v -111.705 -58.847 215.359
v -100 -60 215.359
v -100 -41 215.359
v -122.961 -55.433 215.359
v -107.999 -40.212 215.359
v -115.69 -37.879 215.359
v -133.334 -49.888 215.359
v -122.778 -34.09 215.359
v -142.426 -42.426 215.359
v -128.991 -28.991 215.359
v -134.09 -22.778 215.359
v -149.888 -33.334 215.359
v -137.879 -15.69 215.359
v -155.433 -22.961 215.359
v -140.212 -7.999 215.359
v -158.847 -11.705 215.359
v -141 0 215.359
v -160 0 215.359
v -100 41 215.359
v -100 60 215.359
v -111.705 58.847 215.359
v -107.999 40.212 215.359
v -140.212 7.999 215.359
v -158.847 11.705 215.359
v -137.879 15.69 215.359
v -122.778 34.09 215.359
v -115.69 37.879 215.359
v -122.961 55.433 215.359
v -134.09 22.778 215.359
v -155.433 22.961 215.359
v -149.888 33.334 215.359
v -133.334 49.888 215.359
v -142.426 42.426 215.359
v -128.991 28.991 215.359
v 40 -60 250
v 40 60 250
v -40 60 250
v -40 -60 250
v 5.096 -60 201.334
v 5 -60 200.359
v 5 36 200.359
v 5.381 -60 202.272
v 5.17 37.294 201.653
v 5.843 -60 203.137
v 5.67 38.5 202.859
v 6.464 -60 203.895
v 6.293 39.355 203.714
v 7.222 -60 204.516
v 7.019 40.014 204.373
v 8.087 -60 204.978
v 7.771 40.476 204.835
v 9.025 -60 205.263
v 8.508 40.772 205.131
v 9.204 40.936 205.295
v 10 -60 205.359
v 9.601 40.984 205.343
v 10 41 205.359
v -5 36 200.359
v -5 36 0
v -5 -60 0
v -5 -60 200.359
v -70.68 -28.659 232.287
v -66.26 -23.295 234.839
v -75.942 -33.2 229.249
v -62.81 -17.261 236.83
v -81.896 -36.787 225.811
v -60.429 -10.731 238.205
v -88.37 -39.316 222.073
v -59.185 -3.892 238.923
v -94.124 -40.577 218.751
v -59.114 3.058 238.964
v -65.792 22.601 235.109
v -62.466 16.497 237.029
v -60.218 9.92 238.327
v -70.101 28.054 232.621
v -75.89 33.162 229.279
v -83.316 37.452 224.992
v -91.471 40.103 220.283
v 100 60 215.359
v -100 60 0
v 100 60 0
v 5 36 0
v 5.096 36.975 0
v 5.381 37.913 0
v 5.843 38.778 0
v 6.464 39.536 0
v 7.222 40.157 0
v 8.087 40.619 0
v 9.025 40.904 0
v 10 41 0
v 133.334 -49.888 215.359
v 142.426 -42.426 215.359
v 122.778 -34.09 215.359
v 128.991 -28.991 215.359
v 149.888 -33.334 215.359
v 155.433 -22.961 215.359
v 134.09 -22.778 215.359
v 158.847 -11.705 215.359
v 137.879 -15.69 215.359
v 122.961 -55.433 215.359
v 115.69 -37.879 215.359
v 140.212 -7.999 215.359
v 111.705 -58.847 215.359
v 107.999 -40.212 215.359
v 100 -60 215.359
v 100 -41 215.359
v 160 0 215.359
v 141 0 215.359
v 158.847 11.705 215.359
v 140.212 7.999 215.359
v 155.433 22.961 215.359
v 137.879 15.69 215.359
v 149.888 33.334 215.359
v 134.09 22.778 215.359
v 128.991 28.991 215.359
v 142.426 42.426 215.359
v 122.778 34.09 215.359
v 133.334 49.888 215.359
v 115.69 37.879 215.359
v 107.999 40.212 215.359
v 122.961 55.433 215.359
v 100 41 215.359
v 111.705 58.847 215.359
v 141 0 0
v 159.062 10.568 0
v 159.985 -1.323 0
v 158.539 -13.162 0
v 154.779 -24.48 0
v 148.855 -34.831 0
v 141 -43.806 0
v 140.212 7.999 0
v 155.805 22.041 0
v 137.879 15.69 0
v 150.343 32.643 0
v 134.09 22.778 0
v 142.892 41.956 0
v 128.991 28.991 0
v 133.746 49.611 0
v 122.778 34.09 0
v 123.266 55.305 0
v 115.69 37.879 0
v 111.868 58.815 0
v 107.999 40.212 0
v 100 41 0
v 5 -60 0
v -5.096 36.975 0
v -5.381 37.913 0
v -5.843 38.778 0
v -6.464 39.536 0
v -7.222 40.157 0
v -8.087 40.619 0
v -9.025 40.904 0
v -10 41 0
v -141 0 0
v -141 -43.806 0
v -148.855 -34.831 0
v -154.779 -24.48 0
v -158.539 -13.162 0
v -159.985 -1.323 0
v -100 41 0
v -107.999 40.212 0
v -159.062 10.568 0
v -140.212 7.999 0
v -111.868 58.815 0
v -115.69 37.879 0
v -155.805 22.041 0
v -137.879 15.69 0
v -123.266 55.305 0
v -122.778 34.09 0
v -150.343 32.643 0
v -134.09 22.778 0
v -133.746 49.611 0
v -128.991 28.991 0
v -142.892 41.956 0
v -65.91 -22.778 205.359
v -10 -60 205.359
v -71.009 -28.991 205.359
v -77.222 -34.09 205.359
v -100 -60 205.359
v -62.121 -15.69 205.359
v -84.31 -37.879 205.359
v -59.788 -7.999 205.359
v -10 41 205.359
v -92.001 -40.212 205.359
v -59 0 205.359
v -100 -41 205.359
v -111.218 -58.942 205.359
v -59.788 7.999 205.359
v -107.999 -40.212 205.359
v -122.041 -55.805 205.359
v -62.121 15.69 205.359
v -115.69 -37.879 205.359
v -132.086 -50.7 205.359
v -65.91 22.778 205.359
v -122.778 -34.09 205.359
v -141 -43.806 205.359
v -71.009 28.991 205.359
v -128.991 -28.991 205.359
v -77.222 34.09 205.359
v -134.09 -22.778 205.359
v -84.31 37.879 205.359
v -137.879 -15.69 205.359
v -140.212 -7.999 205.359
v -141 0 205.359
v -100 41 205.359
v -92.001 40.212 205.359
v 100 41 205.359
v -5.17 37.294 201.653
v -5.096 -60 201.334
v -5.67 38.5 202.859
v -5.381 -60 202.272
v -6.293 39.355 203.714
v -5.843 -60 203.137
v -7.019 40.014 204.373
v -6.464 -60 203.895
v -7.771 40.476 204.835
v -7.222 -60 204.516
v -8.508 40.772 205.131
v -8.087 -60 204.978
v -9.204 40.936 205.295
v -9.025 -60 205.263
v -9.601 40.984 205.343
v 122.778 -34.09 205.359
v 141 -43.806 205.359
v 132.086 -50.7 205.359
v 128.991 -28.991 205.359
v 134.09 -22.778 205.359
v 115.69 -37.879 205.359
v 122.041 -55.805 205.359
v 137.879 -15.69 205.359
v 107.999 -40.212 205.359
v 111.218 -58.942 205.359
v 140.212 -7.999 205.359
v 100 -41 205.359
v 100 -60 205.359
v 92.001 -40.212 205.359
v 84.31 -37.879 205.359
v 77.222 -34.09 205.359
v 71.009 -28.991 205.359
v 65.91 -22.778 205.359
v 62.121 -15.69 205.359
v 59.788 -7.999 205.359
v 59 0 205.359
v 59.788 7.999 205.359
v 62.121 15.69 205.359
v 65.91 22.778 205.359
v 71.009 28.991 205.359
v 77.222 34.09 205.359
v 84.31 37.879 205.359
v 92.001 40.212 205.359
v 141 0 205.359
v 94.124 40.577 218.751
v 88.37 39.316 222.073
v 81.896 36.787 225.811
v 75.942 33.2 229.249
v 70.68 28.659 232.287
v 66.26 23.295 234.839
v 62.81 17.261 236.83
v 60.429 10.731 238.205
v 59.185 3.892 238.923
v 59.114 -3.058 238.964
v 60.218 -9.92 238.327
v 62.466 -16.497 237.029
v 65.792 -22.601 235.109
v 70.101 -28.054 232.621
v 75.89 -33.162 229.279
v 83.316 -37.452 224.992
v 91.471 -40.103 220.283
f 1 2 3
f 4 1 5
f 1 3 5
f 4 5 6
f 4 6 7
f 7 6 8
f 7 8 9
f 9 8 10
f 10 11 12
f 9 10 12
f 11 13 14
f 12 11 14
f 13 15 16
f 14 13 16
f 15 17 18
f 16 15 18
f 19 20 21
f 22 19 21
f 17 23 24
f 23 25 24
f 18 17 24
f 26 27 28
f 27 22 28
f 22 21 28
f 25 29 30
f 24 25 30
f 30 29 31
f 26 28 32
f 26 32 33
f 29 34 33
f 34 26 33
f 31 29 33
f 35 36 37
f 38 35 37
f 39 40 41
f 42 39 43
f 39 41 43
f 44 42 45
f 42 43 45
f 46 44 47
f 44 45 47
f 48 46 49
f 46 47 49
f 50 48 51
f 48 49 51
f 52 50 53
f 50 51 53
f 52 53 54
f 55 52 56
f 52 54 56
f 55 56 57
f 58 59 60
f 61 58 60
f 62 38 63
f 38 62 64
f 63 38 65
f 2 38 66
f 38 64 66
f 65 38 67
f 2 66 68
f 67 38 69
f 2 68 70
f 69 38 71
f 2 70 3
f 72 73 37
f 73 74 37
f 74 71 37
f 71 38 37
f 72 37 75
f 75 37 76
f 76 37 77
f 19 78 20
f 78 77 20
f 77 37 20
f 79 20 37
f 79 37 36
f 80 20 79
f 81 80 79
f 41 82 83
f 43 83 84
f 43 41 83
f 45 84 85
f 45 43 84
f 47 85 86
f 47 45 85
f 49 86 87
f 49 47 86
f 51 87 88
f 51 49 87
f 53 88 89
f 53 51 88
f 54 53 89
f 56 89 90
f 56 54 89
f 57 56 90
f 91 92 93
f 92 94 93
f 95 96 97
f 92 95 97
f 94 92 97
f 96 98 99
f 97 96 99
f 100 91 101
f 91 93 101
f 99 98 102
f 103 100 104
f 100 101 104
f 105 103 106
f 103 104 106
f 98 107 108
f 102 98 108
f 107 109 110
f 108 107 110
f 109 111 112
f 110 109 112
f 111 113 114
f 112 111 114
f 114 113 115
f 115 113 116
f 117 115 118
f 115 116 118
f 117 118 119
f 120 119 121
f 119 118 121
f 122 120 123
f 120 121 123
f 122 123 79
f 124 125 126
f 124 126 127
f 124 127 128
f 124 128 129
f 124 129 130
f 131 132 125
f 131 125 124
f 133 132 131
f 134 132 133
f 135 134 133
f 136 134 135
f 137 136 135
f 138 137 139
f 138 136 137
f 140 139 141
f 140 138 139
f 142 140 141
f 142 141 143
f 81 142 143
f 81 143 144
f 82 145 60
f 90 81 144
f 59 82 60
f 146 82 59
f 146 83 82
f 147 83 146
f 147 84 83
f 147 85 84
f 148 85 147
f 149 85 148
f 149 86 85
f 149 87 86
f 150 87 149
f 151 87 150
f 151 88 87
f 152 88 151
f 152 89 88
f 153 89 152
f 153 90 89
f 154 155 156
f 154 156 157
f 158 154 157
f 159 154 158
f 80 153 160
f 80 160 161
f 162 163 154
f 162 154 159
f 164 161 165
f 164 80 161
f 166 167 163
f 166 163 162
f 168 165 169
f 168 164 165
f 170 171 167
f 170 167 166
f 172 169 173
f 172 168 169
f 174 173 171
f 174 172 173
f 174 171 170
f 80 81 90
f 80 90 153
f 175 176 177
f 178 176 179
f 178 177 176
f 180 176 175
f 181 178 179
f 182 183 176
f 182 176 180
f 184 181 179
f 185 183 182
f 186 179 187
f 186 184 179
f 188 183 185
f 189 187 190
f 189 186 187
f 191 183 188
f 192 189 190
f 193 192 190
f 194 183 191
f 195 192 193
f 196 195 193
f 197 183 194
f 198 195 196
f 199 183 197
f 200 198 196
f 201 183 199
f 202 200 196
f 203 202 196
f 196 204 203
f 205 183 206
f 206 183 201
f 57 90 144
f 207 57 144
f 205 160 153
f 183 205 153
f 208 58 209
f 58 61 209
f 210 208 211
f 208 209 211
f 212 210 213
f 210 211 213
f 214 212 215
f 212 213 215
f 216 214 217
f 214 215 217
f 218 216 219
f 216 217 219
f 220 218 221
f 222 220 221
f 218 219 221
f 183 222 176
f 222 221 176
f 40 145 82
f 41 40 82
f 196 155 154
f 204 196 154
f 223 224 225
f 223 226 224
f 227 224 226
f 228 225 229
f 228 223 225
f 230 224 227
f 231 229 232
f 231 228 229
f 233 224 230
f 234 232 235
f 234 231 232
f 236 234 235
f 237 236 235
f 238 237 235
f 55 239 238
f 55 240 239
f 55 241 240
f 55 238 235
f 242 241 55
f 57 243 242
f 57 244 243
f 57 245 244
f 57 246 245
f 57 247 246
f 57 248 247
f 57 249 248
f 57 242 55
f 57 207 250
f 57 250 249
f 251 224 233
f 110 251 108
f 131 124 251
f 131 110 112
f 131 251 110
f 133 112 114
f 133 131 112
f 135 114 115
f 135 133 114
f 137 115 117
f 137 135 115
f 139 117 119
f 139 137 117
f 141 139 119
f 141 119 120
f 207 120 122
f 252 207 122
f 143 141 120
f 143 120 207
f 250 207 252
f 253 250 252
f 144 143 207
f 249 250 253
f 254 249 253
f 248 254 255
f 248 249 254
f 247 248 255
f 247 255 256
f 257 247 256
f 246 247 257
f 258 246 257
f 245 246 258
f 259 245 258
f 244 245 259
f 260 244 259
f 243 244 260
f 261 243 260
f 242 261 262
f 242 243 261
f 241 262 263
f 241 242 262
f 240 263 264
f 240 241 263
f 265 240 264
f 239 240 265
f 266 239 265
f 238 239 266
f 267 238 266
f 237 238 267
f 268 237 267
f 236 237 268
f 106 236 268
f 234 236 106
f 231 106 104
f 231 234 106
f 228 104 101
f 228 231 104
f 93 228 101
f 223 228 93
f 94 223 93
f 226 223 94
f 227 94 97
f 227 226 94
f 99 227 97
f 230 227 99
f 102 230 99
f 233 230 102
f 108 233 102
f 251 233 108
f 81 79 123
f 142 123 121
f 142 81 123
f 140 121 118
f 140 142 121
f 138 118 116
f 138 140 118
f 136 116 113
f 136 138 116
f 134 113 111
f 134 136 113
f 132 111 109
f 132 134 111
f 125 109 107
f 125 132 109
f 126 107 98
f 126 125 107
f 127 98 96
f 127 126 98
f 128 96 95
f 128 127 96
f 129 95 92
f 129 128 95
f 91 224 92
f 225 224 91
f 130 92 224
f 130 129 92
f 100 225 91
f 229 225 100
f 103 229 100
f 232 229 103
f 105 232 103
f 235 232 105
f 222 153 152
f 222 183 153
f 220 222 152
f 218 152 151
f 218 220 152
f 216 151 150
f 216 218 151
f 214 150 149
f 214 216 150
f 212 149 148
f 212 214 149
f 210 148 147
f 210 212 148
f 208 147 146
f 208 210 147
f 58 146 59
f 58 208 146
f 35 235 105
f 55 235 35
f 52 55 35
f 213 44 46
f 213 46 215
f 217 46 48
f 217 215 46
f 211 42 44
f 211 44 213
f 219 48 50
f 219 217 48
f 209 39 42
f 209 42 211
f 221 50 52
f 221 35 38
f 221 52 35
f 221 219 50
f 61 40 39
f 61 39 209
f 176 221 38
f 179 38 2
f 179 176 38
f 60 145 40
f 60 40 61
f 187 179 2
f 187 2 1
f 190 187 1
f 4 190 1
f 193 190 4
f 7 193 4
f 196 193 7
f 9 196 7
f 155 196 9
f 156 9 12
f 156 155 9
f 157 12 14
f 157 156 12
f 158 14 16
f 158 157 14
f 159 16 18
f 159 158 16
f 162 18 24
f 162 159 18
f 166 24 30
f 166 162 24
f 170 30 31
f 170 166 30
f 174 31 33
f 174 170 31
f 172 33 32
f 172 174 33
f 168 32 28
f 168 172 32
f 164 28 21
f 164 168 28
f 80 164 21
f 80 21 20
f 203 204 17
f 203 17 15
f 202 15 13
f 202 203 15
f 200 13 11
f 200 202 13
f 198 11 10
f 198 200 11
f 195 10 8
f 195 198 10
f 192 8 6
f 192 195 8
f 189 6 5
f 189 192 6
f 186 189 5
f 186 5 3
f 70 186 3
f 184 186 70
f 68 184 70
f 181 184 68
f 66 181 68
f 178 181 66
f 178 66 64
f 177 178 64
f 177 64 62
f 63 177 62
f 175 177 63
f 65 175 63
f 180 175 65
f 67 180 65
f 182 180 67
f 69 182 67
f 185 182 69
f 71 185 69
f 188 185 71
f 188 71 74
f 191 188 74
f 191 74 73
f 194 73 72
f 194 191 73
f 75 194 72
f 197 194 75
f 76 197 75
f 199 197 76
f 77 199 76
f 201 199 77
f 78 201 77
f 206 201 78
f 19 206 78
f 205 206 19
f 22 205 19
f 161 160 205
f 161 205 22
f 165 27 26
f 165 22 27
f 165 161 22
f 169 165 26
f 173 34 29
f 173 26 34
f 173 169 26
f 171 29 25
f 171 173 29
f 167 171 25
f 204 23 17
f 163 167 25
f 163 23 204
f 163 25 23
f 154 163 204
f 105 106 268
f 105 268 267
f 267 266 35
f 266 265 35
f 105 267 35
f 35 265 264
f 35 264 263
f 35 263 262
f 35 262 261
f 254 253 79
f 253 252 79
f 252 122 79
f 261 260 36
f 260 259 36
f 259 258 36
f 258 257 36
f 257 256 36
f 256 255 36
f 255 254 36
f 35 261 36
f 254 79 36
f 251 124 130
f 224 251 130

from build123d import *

# Parameters (mm, degrees)
SKETCH1_R           = 41
BOSS_EXTRUDE1_DEPTH = 250
CUT_EXTRUDE2_DEPTH  = 130
CUT_EXTRUDE3_DEPTH  = 205.358983849
FILLET1_R           = 5


with BuildPart() as part:
    # Sketch1 → Boss-Extrude1 (new body)
    with BuildSketch(Plane.XY):
        with BuildLine():
            Line((-100, 60), (100, 60))
            ThreePointArc((100, 60), (160, 0), (100, -60))
            Line((100, -60), (-100, -60))
            ThreePointArc((-100, -60), (-160, 0), (-100, 60))
        make_face()
        with Locations((100, 0)):
            Circle(SKETCH1_R, mode=Mode.SUBTRACT)
        with Locations(Location((-100, 0, 0), (0, 0, 180))):
            Circle(SKETCH1_R, mode=Mode.SUBTRACT)
    extrude(amount=BOSS_EXTRUDE1_DEPTH)

    # Sketch5 → Cut-Extrude2 (cut, symmetric)
    with BuildSketch(Plane(origin=(0, 0, 0), x_dir=(1, 0, 0), z_dir=(0, 1, 0))):
        Polygon((100, -215.358983849), (40, -250), (-40, -250), (-100, -215.358983849), (-160, -215.358983849), (-160, -312.331187037), (-8.326687978, -312.331187037), (8.326687978, -312.331187037), (160, -312.331187037), (160, -215.358983849), align=None)
    extrude(amount=CUT_EXTRUDE2_DEPTH, both=True, mode=Mode.SUBTRACT)

    # Sketch7 → Cut-Extrude3 (cut)
    with BuildSketch(Plane(origin=(0, 0, 0), x_dir=(-1, 0, 0), z_dir=(0, 0, -1))):
        with BuildLine():
            Line((100, 41), (5, 41))
            Line((5, 41), (5, -85.727890399))
            Line((5, -85.727890399), (141, -85.727890399))
            Line((141, -85.727890399), (141, 0))
            ThreePointArc((141, 0), (128.991378029, 28.991378029), (100, 41))
        make_face()
        with BuildLine():
            Line((-141, 0), (-141, -85.727890399))
            Line((-141, -85.727890399), (-5, -85.727890399))
            Line((-5, -85.727890399), (-5, 41))
            Line((-5, 41), (-100, 41))
            ThreePointArc((-100, 41), (-128.991378029, 28.991378029), (-141, 0))
        make_face()
    extrude(amount=-CUT_EXTRUDE3_DEPTH, mode=Mode.SUBTRACT)

    # Fillet1
    fillet1_edges = [part.edges().sort_by_distance(p)[0] for p in [
        (5, -9.5, 205.358983849),
        (5, 41, 102.679491924),
        (-5, -9.5, 205.358983849),
        (-5, 41, 102.679491924),
    ]]
    fillet(fillet1_edges, radius=FILLET1_R)


solid = part.part
